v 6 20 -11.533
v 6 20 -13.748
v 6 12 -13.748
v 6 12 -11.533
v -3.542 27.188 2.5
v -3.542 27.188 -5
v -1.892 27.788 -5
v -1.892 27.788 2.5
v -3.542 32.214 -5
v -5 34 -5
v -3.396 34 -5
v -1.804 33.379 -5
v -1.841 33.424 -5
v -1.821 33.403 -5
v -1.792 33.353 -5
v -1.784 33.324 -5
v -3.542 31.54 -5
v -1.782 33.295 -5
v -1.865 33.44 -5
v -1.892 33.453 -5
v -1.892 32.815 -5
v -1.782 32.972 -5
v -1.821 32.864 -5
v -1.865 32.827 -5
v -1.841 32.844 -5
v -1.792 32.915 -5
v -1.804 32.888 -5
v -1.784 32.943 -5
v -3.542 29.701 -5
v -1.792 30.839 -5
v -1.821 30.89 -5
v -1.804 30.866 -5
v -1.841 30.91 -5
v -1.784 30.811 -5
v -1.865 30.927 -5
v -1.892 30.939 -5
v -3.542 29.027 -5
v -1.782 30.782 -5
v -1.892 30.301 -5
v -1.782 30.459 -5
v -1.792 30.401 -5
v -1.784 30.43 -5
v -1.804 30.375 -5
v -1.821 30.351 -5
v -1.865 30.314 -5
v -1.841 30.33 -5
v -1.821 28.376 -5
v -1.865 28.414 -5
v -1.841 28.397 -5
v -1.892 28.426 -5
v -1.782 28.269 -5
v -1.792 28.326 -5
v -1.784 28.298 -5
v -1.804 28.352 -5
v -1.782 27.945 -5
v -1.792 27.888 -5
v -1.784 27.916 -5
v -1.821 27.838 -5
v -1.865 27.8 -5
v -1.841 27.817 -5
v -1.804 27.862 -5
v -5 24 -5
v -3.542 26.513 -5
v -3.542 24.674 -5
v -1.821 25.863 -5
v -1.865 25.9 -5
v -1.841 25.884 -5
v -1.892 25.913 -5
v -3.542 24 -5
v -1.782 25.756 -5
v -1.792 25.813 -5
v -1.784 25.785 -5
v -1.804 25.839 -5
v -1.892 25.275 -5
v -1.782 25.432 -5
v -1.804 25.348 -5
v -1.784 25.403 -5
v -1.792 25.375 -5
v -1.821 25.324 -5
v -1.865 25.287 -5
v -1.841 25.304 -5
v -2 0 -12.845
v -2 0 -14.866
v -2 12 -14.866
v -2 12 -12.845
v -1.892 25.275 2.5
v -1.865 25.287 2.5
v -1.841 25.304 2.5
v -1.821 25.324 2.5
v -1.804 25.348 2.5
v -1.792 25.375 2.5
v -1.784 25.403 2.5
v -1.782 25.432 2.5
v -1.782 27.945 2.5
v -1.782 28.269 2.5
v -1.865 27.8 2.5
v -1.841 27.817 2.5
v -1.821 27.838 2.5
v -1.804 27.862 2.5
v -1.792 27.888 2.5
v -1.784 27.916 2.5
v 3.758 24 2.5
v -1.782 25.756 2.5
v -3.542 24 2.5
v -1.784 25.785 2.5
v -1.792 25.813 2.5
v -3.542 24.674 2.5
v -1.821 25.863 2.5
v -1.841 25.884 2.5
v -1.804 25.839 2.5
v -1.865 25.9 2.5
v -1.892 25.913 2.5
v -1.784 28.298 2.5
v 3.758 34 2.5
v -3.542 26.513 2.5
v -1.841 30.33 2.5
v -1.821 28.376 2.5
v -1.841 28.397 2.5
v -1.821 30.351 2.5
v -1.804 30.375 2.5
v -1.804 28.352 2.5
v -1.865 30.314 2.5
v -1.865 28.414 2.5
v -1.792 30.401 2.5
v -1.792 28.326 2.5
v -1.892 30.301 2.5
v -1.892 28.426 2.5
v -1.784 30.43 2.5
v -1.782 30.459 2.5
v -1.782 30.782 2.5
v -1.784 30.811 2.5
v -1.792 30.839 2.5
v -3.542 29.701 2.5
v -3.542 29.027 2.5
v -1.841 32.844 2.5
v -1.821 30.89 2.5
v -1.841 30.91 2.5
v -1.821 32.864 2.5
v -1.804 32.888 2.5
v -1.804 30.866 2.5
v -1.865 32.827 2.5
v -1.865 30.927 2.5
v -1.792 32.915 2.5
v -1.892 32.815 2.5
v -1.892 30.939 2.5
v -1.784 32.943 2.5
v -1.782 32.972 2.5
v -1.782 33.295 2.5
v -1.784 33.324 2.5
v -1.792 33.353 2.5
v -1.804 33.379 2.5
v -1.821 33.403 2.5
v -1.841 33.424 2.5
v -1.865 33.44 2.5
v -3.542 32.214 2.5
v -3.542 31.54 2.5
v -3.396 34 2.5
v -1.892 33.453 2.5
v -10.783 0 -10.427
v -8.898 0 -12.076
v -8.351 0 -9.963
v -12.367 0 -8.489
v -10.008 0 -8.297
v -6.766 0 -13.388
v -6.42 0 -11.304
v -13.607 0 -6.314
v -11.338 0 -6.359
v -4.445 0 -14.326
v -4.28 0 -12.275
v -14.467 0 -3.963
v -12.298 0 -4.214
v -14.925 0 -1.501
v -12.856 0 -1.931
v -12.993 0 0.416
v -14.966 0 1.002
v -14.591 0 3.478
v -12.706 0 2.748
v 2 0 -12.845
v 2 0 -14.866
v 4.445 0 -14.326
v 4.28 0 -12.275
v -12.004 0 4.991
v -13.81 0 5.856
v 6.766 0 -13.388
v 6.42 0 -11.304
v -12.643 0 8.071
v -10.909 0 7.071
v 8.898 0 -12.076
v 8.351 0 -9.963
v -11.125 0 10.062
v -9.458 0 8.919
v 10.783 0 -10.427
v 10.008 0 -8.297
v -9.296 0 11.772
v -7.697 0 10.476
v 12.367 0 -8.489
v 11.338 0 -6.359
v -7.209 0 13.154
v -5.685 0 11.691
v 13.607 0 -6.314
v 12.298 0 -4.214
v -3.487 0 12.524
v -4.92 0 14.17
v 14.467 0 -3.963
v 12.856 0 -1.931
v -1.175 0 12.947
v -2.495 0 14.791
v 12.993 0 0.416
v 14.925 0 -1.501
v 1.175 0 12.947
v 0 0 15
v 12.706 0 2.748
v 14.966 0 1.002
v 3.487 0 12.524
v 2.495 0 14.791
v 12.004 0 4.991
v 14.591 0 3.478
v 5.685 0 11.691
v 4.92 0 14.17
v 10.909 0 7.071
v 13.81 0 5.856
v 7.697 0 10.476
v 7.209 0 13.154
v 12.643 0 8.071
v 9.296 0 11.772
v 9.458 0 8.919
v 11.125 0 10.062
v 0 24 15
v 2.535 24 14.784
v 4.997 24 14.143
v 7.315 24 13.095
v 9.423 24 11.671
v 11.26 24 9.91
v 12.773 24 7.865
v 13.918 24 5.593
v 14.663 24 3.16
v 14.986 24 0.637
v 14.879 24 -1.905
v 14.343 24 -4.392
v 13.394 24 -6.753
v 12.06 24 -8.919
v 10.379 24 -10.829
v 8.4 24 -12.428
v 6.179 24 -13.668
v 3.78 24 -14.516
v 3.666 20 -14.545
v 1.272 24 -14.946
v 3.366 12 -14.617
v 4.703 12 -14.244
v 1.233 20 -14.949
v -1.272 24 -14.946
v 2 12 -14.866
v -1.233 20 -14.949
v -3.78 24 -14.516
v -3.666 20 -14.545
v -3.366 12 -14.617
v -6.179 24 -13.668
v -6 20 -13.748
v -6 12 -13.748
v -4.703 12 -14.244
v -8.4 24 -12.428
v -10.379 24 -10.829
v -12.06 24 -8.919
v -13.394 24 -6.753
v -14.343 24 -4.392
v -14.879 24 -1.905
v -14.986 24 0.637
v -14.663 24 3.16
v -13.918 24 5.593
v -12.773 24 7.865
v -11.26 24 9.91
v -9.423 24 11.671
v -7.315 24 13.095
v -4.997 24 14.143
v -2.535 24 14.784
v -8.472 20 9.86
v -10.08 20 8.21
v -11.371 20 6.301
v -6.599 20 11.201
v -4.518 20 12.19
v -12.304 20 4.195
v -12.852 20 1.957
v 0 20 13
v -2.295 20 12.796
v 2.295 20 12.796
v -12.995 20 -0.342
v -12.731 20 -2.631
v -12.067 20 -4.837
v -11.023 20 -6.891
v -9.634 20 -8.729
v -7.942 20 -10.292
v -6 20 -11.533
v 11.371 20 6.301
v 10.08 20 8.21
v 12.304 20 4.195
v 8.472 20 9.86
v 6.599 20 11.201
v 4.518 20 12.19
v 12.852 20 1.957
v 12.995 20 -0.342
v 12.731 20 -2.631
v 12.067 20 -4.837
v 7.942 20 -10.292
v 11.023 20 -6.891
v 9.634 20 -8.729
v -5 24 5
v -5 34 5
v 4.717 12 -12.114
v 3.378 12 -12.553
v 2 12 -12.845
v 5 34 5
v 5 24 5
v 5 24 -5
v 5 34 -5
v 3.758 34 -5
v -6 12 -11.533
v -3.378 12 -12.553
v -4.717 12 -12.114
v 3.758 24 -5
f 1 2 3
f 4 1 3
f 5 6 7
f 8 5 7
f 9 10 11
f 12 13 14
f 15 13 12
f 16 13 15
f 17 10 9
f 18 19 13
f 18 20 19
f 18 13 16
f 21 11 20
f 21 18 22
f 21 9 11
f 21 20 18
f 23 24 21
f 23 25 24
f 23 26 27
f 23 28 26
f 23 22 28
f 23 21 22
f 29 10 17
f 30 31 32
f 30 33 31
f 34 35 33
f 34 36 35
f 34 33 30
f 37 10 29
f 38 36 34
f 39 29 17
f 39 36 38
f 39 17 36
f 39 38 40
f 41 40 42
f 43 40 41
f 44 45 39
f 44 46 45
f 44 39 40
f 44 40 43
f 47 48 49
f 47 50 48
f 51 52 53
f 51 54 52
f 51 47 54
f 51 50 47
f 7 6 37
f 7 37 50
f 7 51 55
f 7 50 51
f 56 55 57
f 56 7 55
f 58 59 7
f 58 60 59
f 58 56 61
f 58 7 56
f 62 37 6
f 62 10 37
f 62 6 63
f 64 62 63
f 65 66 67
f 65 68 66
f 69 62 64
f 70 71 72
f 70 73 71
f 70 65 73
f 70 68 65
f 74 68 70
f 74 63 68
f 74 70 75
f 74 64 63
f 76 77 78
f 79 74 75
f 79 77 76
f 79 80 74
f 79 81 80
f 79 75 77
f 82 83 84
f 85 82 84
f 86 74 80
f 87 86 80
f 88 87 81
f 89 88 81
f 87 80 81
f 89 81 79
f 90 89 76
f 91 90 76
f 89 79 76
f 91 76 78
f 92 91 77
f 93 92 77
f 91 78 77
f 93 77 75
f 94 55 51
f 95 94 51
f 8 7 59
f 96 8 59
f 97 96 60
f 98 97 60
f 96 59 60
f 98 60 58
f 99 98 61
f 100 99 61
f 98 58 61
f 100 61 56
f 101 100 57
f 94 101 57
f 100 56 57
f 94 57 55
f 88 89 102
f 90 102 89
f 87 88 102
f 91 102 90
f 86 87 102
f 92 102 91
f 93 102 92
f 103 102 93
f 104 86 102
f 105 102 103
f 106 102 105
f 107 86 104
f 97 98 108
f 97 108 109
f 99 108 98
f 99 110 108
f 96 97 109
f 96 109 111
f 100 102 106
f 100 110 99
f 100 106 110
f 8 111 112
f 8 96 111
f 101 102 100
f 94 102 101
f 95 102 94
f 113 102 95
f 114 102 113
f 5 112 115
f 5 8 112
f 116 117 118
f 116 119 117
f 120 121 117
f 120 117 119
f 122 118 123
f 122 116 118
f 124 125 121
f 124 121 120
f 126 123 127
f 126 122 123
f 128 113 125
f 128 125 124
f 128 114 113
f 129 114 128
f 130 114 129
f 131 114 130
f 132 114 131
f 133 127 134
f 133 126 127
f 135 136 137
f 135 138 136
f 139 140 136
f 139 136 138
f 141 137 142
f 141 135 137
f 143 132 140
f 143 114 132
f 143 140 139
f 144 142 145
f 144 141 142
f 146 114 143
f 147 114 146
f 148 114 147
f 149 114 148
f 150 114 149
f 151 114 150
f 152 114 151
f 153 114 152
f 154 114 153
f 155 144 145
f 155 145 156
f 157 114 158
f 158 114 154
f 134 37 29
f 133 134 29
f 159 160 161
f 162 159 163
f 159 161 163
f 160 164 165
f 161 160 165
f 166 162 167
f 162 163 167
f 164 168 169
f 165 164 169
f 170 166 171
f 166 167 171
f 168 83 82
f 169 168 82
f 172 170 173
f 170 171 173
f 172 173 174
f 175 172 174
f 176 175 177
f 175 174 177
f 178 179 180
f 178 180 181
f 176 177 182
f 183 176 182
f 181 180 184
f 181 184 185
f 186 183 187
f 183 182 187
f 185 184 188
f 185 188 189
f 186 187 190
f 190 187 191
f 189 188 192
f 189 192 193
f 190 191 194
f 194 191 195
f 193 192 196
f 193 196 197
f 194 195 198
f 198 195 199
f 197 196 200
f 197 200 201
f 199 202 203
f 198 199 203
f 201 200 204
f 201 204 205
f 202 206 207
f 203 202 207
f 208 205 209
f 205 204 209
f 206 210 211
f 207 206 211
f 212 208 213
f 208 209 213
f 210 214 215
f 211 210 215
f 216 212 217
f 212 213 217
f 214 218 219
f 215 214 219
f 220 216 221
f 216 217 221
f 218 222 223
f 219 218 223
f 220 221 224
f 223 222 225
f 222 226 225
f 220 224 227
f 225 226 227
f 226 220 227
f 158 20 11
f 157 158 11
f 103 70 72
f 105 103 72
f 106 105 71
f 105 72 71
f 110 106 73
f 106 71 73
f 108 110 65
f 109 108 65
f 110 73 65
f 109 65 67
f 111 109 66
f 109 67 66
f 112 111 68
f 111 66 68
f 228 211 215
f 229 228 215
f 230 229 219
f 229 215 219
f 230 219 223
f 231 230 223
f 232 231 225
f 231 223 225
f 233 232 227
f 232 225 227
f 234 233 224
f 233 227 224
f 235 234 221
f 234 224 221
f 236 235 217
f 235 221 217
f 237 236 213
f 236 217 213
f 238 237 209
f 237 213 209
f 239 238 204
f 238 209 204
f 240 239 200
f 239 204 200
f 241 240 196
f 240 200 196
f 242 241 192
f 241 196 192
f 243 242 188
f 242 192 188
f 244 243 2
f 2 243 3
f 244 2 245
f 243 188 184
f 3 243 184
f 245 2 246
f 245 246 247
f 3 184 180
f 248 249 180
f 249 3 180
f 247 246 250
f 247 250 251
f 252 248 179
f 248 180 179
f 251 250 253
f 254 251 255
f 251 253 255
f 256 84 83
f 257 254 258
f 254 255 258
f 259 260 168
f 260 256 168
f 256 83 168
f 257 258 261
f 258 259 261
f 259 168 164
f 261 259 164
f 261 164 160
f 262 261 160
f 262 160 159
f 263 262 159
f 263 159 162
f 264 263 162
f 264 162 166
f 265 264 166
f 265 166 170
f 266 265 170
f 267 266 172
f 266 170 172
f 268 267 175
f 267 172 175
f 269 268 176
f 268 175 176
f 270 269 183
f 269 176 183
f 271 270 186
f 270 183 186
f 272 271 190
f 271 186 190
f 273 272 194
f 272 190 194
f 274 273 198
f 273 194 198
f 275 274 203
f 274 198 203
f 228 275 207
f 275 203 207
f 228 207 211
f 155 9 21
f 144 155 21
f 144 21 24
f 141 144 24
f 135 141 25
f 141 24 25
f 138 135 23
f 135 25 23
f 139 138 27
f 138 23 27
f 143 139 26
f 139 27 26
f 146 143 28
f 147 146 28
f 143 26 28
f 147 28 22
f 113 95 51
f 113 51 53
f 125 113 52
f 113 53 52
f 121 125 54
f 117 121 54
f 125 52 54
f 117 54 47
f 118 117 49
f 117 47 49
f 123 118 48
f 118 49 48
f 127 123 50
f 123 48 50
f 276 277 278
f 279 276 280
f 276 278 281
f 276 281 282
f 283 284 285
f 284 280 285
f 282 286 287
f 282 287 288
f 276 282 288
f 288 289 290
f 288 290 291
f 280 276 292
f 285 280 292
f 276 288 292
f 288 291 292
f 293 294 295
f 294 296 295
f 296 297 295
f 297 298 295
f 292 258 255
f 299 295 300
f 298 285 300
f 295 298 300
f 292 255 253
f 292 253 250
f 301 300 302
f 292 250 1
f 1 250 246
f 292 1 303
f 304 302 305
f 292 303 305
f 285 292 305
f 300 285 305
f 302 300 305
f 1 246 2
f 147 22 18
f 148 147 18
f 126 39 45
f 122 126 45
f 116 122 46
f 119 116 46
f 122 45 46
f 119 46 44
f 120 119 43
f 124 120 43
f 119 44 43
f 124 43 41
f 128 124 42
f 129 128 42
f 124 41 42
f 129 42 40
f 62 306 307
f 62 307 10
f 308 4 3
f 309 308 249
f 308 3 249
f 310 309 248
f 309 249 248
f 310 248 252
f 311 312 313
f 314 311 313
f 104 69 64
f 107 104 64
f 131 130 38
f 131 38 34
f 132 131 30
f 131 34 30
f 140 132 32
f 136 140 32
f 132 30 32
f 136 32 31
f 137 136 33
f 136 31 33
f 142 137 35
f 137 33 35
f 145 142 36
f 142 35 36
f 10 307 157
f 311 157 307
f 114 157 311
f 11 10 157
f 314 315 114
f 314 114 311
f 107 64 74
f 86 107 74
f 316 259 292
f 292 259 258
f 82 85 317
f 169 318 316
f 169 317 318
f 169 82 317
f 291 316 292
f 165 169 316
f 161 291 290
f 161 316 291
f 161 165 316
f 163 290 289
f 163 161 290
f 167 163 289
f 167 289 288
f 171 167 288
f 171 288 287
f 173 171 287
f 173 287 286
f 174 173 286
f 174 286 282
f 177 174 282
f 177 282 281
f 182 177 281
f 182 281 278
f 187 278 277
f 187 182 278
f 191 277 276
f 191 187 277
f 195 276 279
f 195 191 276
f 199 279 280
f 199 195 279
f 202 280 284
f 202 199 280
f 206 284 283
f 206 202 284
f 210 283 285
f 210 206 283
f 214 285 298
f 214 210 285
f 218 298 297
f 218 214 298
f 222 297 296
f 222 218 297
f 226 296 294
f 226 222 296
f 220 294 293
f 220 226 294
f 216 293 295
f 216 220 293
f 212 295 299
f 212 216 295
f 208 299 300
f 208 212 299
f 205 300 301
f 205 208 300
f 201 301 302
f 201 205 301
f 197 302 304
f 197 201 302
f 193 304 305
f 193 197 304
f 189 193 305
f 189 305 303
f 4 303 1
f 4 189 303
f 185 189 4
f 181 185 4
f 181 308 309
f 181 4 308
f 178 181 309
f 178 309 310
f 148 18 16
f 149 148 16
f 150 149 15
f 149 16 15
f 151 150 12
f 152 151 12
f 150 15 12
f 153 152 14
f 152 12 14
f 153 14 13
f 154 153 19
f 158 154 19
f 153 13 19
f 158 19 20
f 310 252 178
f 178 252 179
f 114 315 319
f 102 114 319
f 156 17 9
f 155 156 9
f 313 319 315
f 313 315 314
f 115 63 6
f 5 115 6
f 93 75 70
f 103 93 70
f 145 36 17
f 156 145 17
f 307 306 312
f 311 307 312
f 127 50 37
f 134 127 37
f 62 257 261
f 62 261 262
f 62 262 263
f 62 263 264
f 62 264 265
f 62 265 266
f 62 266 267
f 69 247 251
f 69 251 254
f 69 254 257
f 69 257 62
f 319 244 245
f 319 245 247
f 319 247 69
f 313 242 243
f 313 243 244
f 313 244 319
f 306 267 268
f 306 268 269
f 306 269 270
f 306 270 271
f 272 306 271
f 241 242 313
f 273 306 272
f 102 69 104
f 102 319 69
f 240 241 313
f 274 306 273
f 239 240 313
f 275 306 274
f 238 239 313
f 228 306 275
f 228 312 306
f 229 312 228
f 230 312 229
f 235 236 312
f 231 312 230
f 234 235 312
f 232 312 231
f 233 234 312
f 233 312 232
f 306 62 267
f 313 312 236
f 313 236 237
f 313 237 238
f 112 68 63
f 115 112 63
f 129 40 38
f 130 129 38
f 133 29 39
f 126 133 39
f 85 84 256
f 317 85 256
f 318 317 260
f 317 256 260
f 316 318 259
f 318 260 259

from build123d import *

# Parameters (mm, degrees)
SKETCH1_R           = 15
SKETCH1_R_2         = 13
BOSS_EXTRUDE1_DEPTH = 20
SKETCH2_R           = 15
BOSS_EXTRUDE2_DEPTH = 4
SKETCH4_W           = 10
SKETCH4_H           = 10
BOSS_EXTRUDE3_DEPTH = 10
CUT_EXTRUDE2_DEPTH  = 7.5
CUT_EXTRUDE3_DEPTH  = 5


with BuildPart() as part:
    # Sketch1 → Boss-Extrude1 (new body)
    with BuildSketch(Plane(origin=(0, 0, 0), x_dir=(1, 0, 0), z_dir=(0, 1, 0))):
        with Locations(Location((0, 0, 0), (0, 0, 270))):
            Circle(SKETCH1_R)
        with Locations(Location((0, 0, 0), (0, 0, 270))):
            Circle(SKETCH1_R_2, mode=Mode.SUBTRACT)
    extrude(amount=BOSS_EXTRUDE1_DEPTH)

    # Sketch2 → Boss-Extrude2 (add)
    with BuildSketch(Plane(origin=(0, 20, 0), x_dir=(1, 0, 0), z_dir=(0, 1, 0))):
        with Locations(Location((0, 0, 0), (0, 0, 270))):
            Circle(SKETCH2_R)
    extrude(amount=BOSS_EXTRUDE2_DEPTH)

    # Sketch4 → Boss-Extrude3 (add)
    with BuildSketch(Plane(origin=(0, 24, 0), x_dir=(1, 0, 0), z_dir=(0, 1, 0))):
        Rectangle(SKETCH4_W, SKETCH4_H)
    extrude(amount=BOSS_EXTRUDE3_DEPTH)

    # Sketch6 → Cut-Extrude2 (cut)
    with BuildSketch(Plane(origin=(0, 0, -5), x_dir=(-1, 0, 0), z_dir=(0, 0, -1))):
        with BuildLine():
            Line((-1.758355149, 34), (-3.758355149, 34))
            Line((-3.758355149, 34), (-3.758355149, 24))
            Line((-3.758355149, 24), (3.541644851, 24))
            Line((3.541644851, 24), (3.541644851, 24.674283625))
            Line((3.541644851, 24.674283625), (1.891753796, 25.274794859))
            ThreePointArc((1.891753796, 25.274794859), (1.811908661, 25.336062186), (1.781644851, 25.432046729))
            Line((1.781644851, 25.432046729), (1.781644851, 25.755508896))
            ThreePointArc((1.781644851, 25.755508896), (1.811908661, 25.85149344), (1.891753796, 25.912760766))
            Line((1.891753796, 25.912760766), (3.541644851, 26.513272))
            Line((3.541644851, 26.513272), (3.541644851, 27.187555625))
            Line((3.541644851, 27.187555625), (1.891753796, 27.788066859))
            ThreePointArc((1.891753796, 27.788066859), (1.811908661, 27.849334186), (1.781644851, 27.945318729))
            Line((1.781644851, 27.945318729), (1.781644851, 28.268780896))
            ThreePointArc((1.781644851, 28.268780896), (1.811908661, 28.36476544), (1.891753796, 28.426032766))
            Line((1.891753796, 28.426032766), (3.541644851, 29.026544))
            Line((3.541644851, 29.026544), (3.541644851, 29.700827625))
            Line((3.541644851, 29.700827625), (1.891753796, 30.301338859))
            ThreePointArc((1.891753796, 30.301338859), (1.811908661, 30.362606186), (1.781644851, 30.458590729))
            Line((1.781644851, 30.458590729), (1.781644851, 30.782052896))
            ThreePointArc((1.781644851, 30.782052896), (1.811908661, 30.87803744), (1.891753796, 30.939304766))
            Line((1.891753796, 30.939304766), (3.541644851, 31.539816))
            Line((3.541644851, 31.539816), (3.541644851, 32.214099625))
            Line((3.541644851, 32.214099625), (1.891753796, 32.814610859))
            ThreePointArc((1.891753796, 32.814610859), (1.811908661, 32.875878186), (1.781644851, 32.971862729))
            Line((1.781644851, 32.971862729), (1.781644851, 33.295324896))
            ThreePointArc((1.781644851, 33.295324896), (1.811908661, 33.39130944), (1.891753796, 33.452576766))
            Line((1.891753796, 33.452576766), (3.39578677, 34))
            Line((3.39578677, 34), (0.241644851, 34))
            Line((0.241644851, 34), (-1.758355149, 34))
        make_face()
    extrude(amount=-CUT_EXTRUDE2_DEPTH, mode=Mode.SUBTRACT)

    # Sketch8 → Cut-Extrude3 (cut)
    with BuildSketch(Plane(origin=(0, 0, -15), x_dir=(-1, 0, 0), z_dir=(0, 0, -1))):
        Polygon((-6, 12), (-2, 12), (-2, 0), (2, 0), (2, 12), (6, 12), (6, 20), (-6, 20), align=None)
    extrude(amount=-CUT_EXTRUDE3_DEPTH, mode=Mode.SUBTRACT)


solid = part.part
